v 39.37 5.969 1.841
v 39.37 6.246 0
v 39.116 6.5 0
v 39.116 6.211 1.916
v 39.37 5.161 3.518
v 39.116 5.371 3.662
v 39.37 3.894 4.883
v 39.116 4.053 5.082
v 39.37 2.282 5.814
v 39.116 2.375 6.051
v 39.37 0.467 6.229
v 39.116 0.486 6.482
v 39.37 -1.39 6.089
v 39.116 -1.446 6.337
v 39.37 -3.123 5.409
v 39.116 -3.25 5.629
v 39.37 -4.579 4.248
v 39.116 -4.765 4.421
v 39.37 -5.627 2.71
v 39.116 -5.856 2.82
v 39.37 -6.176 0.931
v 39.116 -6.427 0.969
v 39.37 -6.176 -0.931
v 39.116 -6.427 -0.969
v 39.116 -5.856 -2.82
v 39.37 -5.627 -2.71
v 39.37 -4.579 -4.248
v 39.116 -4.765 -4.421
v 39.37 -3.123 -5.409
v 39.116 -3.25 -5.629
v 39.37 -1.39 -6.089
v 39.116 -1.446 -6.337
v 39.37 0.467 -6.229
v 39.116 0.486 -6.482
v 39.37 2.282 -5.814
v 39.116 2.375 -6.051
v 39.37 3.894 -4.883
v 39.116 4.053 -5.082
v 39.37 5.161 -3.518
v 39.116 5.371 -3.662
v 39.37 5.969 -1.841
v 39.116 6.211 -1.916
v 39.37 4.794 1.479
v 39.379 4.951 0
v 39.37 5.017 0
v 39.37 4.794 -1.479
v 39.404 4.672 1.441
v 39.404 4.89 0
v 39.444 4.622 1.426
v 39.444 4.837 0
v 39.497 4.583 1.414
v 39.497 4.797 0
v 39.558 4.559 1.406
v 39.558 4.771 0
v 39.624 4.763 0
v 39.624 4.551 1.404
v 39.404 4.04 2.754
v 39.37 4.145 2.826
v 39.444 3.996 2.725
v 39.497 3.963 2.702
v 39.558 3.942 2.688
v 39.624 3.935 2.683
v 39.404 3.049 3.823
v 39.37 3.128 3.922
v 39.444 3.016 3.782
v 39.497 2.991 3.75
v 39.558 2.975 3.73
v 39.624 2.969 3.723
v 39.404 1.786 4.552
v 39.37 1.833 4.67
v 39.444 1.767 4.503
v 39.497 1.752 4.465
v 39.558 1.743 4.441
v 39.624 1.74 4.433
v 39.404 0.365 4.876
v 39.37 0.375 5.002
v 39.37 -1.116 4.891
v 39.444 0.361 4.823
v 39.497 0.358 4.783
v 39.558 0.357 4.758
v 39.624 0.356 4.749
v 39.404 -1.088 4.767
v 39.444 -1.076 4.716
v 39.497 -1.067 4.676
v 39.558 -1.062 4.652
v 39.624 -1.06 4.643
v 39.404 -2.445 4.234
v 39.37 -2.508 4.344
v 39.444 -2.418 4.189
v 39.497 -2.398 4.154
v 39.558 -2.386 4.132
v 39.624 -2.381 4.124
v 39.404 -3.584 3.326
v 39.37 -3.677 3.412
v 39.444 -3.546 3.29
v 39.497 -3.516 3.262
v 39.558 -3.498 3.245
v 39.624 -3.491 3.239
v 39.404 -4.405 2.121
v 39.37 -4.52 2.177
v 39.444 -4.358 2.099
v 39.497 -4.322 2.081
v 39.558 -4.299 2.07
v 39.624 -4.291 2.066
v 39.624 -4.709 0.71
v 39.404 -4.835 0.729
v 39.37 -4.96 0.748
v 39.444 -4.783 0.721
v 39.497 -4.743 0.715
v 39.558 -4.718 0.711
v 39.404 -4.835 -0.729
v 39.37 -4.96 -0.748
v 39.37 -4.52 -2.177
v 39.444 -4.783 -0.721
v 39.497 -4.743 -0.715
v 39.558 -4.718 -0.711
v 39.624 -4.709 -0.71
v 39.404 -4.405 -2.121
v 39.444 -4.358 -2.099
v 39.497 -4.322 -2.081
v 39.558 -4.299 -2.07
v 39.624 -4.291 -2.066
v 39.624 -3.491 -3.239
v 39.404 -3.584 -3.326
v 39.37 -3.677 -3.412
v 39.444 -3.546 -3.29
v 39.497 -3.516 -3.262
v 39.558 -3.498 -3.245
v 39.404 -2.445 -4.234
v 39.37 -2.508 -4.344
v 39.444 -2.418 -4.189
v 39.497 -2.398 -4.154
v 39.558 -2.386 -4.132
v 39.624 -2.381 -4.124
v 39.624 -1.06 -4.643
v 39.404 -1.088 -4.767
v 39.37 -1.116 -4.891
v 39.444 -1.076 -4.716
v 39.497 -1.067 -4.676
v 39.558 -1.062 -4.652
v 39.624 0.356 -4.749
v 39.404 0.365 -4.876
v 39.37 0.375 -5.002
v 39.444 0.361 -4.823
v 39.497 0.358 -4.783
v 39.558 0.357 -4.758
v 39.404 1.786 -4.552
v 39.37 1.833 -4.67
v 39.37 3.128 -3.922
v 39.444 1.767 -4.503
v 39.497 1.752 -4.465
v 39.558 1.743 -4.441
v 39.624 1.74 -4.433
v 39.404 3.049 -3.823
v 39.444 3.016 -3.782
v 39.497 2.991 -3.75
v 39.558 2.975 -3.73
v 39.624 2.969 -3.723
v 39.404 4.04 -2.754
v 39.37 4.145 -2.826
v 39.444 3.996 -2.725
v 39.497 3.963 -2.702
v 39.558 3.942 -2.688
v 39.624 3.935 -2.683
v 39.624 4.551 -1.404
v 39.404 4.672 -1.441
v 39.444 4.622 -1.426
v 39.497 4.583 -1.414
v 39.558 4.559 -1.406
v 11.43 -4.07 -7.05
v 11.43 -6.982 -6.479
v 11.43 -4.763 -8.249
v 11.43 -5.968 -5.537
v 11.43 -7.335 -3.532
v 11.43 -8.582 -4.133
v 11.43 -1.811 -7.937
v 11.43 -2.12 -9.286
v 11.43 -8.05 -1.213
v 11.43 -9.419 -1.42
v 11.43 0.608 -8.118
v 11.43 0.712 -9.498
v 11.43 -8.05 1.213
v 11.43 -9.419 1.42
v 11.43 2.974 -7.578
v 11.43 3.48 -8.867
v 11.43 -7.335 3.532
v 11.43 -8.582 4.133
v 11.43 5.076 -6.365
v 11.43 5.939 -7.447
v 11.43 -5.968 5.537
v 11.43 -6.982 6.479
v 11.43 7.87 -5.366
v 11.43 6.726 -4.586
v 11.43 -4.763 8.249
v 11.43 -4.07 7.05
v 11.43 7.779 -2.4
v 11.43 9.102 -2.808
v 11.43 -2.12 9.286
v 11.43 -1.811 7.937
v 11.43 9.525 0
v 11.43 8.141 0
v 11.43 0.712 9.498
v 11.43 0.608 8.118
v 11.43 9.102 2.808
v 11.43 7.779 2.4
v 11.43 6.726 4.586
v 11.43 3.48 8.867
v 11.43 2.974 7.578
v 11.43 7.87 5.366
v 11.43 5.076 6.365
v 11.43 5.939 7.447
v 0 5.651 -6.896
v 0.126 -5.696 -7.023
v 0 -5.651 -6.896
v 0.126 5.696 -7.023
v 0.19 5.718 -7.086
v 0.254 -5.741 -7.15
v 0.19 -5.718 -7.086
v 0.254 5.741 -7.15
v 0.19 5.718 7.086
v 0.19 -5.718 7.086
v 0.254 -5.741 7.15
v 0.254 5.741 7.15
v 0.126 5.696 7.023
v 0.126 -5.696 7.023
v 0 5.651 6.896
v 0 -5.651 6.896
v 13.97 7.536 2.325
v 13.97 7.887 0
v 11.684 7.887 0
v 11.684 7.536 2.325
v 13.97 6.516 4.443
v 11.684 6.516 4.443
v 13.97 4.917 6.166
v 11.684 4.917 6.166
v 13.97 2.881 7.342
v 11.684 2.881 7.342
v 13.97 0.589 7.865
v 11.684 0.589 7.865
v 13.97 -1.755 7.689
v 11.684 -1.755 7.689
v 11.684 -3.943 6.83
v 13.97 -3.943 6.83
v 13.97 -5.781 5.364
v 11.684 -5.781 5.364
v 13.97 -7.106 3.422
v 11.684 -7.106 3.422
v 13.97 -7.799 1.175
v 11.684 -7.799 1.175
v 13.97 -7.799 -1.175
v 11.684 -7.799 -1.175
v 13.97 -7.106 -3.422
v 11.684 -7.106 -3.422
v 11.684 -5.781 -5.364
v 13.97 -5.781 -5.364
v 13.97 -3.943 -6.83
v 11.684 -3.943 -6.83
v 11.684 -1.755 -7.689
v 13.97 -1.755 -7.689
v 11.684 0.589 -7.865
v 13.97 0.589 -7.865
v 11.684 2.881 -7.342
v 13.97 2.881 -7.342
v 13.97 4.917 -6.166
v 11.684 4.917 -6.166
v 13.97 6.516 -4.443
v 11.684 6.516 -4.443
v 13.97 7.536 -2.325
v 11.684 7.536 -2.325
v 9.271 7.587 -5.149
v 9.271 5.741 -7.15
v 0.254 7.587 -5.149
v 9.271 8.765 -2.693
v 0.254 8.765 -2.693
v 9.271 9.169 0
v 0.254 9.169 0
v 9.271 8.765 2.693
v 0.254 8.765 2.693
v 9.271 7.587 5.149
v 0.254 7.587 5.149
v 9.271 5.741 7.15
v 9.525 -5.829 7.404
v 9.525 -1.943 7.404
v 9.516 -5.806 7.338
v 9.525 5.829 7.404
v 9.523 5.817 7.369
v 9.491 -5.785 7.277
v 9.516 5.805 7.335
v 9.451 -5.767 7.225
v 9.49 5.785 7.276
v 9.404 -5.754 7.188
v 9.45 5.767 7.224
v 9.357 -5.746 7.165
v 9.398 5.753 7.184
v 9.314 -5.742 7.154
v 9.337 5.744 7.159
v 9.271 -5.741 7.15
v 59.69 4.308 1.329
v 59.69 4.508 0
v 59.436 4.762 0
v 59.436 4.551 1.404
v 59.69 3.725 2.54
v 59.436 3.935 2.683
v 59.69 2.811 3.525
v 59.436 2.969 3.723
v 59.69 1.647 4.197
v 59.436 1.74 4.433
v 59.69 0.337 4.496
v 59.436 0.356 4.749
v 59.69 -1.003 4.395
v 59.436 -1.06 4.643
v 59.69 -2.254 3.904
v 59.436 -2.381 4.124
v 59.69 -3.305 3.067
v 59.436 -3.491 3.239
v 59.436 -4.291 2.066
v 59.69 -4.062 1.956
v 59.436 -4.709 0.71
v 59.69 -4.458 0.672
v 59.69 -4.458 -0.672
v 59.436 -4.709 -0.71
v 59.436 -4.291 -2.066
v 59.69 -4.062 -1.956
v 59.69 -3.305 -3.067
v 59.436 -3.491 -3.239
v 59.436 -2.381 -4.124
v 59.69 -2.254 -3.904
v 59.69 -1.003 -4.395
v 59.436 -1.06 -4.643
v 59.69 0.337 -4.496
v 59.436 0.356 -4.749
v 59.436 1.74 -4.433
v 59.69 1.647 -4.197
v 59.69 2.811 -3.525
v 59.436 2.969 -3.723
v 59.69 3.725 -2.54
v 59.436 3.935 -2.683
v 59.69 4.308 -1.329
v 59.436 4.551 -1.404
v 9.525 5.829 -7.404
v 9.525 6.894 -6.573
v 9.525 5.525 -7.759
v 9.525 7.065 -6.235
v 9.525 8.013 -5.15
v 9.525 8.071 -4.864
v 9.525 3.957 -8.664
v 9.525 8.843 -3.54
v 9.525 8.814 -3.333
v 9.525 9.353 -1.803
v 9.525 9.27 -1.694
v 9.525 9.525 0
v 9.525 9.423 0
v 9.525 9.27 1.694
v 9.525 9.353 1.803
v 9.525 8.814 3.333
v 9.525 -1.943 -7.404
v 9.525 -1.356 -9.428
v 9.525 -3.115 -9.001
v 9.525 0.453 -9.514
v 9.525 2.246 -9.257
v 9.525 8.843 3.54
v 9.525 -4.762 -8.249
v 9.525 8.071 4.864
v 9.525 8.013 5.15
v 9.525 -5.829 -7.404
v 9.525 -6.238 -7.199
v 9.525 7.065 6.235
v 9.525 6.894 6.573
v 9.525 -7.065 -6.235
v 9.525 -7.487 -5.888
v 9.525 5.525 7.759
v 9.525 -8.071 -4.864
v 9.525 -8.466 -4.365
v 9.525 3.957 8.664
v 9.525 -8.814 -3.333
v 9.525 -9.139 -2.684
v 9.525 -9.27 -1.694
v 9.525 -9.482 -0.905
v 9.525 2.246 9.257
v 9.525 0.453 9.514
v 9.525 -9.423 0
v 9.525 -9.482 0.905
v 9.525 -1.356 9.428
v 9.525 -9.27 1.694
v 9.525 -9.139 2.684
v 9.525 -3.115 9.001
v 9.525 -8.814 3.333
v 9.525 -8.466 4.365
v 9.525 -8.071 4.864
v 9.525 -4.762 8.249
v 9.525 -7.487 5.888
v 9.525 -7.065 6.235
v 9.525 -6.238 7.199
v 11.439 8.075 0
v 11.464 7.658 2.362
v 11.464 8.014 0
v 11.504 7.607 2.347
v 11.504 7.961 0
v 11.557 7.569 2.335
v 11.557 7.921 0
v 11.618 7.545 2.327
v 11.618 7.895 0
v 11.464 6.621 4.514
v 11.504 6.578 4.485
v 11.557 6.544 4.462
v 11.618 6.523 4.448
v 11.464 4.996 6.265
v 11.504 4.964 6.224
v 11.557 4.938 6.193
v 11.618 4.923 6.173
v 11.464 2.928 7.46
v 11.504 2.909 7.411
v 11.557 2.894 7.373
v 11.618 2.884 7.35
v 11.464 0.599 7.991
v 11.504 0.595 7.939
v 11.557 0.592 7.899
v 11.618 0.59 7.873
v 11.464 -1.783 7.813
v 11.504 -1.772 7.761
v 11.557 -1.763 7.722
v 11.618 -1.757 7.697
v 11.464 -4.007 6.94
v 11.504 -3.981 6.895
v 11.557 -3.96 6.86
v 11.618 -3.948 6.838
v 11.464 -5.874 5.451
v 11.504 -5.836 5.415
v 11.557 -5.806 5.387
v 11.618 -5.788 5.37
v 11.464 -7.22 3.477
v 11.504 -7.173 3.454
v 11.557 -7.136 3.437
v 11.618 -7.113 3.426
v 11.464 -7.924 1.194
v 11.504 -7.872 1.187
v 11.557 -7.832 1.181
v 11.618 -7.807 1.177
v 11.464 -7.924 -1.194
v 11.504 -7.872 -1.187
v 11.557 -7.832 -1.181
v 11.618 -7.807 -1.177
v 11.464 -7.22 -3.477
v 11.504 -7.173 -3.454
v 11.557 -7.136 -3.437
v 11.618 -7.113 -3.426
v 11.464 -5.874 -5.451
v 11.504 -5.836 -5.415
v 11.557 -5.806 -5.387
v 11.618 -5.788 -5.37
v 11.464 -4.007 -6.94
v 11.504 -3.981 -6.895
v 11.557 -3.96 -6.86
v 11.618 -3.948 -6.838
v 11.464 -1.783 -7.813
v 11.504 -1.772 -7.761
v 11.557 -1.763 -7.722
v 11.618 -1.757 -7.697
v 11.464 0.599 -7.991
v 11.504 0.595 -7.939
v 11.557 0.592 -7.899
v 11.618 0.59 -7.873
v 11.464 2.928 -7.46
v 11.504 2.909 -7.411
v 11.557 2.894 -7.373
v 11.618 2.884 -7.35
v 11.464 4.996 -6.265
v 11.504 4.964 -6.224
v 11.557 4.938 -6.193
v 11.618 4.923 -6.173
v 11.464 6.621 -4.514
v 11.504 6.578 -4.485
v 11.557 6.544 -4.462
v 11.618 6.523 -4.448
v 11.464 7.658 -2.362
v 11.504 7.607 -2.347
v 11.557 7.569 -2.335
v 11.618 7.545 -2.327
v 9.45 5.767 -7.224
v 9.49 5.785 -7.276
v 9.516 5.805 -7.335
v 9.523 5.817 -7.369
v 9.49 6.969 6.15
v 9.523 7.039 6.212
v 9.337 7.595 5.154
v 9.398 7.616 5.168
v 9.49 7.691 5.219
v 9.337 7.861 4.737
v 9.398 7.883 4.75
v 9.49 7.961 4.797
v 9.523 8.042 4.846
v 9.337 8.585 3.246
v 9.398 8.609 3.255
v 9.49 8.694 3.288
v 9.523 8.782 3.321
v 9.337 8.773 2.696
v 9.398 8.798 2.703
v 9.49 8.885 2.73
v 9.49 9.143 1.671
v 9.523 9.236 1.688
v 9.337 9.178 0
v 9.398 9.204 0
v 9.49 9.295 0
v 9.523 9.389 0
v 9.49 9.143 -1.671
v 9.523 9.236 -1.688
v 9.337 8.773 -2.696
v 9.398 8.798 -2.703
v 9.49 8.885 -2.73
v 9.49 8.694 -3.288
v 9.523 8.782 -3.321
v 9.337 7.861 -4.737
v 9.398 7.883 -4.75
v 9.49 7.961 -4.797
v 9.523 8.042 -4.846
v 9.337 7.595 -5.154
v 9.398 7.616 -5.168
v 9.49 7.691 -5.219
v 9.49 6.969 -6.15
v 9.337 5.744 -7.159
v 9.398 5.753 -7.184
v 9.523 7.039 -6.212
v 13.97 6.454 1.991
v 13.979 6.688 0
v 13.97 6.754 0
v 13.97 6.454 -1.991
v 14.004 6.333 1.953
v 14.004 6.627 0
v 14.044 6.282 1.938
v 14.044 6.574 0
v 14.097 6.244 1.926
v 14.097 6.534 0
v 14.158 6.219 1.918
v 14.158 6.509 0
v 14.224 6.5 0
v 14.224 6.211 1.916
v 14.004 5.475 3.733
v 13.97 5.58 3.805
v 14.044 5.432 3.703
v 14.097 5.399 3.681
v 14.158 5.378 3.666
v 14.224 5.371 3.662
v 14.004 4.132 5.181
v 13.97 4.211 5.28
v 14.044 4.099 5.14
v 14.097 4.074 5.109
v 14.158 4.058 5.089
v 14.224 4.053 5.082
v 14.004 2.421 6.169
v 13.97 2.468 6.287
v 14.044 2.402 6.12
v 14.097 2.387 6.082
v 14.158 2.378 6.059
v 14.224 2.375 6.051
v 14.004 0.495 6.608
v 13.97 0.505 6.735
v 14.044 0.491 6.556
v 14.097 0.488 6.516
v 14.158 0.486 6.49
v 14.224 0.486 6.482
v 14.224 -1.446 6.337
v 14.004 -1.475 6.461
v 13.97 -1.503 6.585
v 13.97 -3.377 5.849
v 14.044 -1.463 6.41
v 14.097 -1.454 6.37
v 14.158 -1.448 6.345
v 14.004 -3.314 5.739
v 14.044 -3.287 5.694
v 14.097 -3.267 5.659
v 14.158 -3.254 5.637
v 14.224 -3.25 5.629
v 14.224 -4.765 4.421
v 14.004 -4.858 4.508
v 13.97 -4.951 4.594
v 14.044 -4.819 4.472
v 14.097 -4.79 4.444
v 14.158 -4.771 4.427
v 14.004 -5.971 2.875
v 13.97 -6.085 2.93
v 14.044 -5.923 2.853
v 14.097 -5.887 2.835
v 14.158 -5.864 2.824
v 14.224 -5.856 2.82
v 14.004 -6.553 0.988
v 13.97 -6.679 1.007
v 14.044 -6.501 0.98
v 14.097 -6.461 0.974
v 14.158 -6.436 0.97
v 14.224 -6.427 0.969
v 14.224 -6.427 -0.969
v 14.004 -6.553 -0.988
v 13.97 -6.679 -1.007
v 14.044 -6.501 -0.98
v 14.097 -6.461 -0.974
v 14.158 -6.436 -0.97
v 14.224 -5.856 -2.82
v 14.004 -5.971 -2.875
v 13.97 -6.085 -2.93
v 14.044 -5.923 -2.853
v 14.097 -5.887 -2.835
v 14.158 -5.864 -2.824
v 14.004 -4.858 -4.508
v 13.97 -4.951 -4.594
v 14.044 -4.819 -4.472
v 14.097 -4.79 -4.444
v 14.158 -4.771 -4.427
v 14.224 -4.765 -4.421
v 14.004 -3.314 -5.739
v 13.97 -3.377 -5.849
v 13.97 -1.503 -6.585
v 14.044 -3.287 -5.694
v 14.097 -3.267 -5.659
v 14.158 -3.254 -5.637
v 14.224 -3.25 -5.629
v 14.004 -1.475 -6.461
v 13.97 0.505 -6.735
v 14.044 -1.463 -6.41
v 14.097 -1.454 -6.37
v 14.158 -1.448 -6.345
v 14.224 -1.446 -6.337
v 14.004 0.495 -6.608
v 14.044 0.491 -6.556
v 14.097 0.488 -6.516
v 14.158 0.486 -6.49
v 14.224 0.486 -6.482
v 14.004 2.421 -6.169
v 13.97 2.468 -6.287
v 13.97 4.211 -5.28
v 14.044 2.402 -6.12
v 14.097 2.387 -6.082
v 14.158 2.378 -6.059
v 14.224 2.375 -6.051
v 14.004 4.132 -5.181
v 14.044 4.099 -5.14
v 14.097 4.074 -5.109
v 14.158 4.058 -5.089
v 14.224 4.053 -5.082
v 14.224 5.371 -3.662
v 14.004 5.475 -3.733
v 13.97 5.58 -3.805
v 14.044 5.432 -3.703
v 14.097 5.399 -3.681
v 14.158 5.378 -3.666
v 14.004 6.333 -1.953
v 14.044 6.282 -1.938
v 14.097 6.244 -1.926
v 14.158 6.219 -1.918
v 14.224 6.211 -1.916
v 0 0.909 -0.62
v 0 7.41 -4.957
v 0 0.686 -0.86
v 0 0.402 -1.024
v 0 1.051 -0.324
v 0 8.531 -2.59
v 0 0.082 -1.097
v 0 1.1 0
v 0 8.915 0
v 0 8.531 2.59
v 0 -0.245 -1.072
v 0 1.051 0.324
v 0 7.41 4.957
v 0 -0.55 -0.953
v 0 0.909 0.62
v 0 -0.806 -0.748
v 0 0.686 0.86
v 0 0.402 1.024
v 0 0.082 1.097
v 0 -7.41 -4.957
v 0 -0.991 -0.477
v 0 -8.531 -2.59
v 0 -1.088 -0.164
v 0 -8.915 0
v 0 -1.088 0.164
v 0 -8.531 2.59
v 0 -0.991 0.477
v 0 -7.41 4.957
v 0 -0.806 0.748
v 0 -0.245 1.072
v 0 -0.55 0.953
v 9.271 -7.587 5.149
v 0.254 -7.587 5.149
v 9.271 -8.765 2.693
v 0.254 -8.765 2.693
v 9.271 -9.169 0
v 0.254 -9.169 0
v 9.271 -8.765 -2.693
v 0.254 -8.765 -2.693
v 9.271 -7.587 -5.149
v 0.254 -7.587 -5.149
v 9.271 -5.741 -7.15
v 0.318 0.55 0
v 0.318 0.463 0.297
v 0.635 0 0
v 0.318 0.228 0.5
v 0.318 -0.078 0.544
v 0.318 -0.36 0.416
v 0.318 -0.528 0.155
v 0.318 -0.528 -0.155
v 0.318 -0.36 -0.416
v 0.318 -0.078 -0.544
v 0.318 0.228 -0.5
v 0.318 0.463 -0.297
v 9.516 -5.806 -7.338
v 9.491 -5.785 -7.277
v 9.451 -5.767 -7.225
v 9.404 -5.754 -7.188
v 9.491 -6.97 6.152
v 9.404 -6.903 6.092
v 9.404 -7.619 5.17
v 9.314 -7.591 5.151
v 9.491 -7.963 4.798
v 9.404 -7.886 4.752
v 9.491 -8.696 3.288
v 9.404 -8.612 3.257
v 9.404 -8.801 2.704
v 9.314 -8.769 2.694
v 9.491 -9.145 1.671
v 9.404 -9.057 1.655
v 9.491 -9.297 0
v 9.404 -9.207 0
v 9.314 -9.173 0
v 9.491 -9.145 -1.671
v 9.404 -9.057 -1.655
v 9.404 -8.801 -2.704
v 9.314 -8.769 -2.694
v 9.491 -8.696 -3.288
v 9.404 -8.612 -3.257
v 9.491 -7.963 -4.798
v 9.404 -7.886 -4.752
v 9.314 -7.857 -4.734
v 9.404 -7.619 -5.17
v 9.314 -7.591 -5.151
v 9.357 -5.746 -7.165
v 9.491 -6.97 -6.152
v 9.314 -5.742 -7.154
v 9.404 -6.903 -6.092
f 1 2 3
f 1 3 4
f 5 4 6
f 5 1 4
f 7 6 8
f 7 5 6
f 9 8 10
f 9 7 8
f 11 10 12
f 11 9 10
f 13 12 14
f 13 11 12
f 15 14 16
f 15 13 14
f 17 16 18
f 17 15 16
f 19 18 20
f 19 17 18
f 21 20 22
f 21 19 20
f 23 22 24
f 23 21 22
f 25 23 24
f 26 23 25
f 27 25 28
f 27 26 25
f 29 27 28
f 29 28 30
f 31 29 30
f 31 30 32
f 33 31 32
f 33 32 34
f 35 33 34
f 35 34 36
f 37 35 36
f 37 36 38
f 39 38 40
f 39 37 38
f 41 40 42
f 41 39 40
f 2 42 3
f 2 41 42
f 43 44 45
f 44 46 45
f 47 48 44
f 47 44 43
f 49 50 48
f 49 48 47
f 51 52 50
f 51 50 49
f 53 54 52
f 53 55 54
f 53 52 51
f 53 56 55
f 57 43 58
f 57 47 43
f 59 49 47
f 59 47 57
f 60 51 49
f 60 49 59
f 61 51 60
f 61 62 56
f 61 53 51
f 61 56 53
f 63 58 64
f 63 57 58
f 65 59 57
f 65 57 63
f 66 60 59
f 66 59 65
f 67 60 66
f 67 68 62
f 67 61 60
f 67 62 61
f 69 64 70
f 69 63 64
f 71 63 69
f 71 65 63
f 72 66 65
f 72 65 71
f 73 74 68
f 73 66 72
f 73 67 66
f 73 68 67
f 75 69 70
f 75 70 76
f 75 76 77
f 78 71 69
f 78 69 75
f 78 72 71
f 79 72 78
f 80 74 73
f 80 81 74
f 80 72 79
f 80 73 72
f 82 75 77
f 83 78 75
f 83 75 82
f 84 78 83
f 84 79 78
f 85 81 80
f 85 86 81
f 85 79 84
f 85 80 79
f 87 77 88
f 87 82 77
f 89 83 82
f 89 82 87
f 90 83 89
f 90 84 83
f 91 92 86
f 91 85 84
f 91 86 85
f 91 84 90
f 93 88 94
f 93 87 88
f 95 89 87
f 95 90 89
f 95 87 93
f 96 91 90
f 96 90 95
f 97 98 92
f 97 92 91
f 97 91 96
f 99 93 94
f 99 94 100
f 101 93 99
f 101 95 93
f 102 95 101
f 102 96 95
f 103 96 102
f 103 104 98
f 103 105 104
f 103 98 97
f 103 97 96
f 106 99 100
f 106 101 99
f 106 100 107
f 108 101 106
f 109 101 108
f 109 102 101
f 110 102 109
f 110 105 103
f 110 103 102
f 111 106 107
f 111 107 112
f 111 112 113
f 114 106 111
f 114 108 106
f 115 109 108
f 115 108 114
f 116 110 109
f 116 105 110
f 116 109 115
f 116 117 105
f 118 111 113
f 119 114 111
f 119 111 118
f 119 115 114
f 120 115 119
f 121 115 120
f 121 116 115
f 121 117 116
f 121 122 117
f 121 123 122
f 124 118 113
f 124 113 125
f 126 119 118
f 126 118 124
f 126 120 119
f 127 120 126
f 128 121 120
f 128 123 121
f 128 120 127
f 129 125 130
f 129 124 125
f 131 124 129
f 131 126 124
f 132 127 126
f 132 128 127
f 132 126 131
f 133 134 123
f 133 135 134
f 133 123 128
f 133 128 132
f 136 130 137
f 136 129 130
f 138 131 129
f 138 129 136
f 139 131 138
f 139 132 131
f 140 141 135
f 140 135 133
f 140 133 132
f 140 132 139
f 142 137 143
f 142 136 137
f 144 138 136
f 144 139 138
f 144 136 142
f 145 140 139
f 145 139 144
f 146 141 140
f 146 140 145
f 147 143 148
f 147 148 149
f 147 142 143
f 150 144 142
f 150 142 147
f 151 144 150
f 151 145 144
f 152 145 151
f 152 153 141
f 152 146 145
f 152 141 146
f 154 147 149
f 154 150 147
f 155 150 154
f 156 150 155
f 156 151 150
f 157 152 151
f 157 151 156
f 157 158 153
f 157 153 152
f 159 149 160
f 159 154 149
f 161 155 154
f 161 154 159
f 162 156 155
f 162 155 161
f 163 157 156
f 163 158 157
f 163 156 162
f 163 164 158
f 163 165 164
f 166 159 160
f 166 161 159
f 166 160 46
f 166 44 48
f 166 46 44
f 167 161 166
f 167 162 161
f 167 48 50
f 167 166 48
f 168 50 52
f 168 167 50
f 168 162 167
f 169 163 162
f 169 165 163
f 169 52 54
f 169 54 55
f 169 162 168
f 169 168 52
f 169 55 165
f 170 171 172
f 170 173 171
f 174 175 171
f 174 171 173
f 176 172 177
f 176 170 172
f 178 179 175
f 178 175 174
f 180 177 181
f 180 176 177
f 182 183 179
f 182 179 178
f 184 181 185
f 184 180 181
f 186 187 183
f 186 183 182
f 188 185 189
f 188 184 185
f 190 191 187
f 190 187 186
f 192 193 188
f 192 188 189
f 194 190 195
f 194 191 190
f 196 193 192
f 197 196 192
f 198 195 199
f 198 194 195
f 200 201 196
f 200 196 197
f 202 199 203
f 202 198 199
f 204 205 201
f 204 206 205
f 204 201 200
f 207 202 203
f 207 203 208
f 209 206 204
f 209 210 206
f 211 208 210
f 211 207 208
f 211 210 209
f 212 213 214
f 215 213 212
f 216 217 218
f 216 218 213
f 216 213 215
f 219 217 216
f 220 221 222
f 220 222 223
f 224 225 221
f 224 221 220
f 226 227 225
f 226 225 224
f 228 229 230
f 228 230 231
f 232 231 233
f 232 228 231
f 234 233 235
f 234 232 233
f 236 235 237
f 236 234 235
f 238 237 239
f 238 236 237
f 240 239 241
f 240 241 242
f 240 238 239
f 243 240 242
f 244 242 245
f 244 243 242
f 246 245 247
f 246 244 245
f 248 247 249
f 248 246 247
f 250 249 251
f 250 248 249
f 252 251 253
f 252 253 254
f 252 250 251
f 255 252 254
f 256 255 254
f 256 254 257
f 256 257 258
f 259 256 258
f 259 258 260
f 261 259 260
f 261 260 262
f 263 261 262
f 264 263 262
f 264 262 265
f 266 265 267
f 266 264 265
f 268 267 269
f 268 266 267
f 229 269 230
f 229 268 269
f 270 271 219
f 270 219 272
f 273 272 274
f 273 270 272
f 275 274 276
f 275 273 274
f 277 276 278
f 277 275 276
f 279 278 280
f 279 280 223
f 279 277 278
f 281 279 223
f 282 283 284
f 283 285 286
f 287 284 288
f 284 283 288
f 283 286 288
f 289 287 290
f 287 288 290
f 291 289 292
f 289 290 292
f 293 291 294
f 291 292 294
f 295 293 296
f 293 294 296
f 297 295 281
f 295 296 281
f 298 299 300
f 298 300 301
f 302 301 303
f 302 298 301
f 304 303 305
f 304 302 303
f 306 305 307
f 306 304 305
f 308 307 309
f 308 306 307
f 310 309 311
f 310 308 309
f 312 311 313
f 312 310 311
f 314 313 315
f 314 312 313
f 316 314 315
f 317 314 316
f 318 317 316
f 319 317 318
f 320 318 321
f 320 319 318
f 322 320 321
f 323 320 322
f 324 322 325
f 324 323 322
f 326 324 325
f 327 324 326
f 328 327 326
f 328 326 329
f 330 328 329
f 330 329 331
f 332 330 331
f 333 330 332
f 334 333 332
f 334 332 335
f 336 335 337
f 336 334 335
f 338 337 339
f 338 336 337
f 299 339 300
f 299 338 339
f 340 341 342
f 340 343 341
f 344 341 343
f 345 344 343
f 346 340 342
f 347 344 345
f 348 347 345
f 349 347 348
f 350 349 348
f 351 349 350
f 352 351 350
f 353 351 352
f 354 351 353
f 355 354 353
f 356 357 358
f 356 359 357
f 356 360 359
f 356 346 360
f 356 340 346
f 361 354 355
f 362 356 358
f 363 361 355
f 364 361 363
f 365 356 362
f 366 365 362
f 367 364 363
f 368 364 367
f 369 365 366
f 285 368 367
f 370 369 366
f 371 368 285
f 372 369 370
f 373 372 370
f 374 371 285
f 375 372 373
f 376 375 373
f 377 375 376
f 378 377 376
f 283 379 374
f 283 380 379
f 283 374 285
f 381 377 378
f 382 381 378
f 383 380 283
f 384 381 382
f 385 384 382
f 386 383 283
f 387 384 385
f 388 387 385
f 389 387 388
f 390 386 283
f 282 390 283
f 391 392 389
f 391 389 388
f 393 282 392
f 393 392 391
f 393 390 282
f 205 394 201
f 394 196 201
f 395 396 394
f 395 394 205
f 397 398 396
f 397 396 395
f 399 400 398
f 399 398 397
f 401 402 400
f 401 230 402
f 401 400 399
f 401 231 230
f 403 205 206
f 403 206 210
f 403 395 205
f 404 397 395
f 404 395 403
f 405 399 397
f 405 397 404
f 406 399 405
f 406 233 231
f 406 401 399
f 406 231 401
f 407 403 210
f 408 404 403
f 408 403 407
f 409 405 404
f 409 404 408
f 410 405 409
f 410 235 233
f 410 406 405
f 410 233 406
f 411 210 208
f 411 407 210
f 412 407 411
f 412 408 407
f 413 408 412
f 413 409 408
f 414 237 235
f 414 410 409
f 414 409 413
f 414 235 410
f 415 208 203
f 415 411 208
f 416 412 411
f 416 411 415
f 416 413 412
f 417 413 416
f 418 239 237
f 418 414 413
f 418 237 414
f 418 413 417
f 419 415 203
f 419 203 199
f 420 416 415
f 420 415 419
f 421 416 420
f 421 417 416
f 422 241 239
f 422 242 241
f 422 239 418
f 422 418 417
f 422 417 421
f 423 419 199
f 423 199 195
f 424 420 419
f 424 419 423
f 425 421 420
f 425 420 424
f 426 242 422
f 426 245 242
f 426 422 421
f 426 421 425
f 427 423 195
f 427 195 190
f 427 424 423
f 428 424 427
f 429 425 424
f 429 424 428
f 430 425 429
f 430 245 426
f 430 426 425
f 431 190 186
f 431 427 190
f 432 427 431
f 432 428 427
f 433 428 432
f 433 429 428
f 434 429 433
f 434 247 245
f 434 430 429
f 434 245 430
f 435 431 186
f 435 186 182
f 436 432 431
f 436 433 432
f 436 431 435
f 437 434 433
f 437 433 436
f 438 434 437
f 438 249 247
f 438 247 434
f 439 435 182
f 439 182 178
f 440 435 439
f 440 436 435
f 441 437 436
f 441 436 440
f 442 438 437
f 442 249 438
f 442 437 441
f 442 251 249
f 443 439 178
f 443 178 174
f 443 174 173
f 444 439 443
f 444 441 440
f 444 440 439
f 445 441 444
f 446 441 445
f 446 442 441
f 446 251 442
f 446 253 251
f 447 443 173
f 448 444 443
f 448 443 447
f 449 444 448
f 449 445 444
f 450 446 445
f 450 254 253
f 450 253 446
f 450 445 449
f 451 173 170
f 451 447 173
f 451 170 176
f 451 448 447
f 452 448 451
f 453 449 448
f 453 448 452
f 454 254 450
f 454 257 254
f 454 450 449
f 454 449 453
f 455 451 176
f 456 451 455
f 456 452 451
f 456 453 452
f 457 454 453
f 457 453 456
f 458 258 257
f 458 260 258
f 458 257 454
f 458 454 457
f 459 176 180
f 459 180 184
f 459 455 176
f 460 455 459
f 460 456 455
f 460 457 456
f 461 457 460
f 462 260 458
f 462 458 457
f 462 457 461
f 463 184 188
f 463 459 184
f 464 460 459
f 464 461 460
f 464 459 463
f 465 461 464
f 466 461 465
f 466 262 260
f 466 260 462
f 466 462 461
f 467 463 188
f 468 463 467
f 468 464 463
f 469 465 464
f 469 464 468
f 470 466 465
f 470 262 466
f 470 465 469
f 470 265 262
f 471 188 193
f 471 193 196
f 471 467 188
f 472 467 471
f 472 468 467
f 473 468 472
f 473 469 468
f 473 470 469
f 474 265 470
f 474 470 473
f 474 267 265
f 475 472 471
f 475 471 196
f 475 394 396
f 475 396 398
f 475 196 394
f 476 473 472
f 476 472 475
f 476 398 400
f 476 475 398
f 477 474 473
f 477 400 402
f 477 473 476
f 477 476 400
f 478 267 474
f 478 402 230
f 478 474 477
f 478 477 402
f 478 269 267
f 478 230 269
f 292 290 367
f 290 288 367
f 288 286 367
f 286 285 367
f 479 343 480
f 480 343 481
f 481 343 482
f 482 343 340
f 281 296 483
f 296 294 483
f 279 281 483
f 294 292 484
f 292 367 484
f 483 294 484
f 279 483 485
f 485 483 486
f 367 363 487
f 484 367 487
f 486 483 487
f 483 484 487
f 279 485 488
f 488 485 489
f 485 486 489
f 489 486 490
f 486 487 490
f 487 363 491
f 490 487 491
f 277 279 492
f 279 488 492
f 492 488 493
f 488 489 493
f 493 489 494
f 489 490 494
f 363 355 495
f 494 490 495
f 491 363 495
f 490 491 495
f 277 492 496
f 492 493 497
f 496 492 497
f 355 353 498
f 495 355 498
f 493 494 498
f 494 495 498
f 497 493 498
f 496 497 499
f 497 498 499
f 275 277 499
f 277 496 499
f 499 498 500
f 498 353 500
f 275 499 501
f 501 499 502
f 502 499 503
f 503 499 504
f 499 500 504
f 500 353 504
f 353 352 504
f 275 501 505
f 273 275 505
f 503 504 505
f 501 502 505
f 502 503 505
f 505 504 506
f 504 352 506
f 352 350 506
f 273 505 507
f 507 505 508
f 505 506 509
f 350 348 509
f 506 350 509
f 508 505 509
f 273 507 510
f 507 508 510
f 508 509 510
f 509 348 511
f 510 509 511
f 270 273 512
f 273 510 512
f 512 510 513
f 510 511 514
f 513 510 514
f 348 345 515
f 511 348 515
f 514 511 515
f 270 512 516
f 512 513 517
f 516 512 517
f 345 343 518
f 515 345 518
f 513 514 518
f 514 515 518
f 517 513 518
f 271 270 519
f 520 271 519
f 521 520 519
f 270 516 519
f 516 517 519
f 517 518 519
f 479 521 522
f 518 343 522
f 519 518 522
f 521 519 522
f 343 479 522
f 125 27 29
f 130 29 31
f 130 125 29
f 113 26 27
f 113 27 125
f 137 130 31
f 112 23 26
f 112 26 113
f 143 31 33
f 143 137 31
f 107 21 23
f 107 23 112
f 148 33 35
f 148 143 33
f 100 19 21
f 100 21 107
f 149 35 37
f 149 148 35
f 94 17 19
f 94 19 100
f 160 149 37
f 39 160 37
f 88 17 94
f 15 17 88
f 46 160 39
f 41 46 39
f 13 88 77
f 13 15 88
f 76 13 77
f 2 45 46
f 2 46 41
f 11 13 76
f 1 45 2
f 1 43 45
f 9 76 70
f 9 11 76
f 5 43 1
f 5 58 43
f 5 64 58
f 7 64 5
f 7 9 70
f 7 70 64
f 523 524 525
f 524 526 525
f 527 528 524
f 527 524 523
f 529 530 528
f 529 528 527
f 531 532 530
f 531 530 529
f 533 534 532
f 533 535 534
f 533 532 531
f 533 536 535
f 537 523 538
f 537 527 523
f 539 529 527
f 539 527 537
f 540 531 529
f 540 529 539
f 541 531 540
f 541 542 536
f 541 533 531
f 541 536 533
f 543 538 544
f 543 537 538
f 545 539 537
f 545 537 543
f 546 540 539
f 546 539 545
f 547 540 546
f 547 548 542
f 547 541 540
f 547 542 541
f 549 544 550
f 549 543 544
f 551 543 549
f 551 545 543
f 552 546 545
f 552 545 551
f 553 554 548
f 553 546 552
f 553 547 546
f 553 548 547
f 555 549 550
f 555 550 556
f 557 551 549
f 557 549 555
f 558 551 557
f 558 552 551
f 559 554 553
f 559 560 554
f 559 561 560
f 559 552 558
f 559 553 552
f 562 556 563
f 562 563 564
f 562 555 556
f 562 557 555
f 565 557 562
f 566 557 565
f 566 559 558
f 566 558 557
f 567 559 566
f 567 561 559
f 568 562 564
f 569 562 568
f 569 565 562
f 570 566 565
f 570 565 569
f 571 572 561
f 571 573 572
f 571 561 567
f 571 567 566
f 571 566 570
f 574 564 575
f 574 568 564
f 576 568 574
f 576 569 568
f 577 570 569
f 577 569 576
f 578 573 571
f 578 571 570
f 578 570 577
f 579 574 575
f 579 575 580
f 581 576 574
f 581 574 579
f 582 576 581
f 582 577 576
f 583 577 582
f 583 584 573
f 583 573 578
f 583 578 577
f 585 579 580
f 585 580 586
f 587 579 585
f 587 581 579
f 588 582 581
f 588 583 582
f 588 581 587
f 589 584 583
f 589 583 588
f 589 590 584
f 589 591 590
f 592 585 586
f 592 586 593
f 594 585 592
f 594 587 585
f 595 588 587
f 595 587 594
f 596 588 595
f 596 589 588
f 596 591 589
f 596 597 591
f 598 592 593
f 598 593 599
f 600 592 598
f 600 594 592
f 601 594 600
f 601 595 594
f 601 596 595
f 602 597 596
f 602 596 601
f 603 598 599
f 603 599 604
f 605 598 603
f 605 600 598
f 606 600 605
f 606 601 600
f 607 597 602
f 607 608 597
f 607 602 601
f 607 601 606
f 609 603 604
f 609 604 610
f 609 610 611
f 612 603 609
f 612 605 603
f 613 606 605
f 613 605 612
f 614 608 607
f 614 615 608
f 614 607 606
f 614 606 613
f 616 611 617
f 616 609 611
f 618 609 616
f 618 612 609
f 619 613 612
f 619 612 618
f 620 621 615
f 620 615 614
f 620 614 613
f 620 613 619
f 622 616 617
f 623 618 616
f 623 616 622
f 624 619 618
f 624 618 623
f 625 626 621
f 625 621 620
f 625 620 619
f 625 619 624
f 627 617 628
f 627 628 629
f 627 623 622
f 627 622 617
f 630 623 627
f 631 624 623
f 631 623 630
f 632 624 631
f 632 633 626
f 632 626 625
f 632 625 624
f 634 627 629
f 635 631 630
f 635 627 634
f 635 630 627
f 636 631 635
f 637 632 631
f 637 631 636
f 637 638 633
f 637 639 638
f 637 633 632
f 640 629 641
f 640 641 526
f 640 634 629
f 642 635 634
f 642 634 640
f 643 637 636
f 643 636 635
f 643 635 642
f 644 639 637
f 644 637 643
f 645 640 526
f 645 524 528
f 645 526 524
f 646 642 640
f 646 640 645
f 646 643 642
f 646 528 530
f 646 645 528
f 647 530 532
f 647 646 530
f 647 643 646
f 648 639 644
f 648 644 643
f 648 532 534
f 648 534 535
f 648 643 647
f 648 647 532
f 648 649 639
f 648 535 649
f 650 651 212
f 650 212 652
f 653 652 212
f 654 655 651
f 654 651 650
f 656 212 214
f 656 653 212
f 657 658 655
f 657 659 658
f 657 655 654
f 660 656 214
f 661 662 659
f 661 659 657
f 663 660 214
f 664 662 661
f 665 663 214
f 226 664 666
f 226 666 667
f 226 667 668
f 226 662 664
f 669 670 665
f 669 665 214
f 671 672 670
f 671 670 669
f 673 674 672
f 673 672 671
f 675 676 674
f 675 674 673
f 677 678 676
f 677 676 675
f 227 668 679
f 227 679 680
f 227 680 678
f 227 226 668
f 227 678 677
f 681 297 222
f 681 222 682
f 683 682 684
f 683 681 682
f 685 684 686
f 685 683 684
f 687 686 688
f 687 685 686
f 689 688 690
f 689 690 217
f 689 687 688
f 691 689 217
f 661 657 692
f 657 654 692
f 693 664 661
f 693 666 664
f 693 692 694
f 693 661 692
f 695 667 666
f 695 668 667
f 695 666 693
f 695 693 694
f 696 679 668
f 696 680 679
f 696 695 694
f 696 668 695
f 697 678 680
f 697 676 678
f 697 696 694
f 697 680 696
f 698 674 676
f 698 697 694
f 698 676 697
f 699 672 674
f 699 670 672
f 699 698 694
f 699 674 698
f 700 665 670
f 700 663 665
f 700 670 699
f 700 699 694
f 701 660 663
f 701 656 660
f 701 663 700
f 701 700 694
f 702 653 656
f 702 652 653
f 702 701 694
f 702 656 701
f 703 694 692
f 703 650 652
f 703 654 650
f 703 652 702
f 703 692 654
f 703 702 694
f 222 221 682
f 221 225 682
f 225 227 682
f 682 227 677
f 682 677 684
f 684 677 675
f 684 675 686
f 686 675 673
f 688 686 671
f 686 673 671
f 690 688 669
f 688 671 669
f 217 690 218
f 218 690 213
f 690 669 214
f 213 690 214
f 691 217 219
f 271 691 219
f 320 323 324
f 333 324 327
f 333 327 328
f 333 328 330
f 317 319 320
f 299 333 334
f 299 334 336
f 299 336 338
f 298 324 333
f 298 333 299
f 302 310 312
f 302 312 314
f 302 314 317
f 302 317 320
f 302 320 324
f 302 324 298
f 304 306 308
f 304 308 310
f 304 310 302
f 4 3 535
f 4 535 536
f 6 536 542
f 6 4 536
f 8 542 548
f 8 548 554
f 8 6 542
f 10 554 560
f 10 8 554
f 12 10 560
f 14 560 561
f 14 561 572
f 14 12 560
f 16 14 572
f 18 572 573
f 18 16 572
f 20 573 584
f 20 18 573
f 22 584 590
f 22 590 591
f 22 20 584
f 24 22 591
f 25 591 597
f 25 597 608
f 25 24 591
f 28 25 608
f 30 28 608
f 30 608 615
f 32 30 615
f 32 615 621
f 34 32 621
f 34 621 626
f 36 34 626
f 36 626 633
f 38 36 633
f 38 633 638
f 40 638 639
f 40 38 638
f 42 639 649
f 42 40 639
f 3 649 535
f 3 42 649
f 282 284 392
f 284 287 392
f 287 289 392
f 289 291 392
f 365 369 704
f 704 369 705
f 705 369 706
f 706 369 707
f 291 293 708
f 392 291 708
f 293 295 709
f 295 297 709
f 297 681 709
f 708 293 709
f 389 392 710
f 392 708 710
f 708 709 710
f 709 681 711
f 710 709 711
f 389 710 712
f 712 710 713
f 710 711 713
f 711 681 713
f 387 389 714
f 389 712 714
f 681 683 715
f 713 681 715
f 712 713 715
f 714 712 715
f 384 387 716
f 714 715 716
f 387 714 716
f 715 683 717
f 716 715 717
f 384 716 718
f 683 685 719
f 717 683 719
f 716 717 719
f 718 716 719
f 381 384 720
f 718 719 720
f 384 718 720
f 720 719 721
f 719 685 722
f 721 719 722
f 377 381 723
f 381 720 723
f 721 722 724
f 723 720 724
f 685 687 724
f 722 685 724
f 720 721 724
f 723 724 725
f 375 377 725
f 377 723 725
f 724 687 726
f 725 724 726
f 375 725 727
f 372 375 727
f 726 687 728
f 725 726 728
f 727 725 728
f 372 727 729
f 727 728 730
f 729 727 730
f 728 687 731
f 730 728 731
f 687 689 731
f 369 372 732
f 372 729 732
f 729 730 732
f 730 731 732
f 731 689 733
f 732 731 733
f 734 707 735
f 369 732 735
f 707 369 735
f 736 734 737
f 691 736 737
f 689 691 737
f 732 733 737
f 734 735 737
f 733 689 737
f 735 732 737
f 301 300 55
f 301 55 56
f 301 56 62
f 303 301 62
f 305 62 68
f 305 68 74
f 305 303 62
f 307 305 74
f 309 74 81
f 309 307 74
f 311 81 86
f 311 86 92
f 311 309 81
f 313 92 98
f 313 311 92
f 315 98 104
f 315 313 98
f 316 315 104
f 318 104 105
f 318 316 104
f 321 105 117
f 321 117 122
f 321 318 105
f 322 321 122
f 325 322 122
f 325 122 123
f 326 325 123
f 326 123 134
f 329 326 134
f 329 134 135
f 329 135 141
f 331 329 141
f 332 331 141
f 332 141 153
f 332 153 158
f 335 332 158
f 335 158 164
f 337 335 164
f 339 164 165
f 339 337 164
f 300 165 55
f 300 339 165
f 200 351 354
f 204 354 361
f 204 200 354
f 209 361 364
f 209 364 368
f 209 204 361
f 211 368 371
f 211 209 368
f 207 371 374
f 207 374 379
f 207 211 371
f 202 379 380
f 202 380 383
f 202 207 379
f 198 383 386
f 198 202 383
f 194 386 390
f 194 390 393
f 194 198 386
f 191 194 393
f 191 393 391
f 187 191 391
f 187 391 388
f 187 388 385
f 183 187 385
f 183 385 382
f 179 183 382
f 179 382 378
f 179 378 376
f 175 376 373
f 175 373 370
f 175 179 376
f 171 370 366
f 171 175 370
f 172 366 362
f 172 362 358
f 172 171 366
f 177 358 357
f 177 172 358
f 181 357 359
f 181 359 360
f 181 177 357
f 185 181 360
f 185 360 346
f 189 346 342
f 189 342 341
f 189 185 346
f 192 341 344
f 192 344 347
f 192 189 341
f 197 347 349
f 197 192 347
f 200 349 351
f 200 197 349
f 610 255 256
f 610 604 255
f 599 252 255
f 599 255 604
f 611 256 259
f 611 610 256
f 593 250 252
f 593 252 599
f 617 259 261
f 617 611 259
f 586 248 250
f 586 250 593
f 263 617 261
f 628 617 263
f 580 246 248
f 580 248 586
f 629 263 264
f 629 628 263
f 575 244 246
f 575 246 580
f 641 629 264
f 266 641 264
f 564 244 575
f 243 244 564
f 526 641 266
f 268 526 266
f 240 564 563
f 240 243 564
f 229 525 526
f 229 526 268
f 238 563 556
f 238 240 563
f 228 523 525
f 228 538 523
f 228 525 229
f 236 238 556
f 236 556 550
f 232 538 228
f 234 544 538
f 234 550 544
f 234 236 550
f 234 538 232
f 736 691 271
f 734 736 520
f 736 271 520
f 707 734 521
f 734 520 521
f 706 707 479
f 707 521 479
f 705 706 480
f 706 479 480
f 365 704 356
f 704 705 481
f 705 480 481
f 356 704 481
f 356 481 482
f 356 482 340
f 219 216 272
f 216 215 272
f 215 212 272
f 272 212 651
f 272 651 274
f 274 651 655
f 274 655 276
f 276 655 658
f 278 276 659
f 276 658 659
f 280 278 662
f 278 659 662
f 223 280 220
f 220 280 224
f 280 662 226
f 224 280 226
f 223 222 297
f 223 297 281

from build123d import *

# Parameters (mm, degrees)
CUT_EXTRUDE1_DEPTH = 9.525
CHAMFER1_SIZE      = 0.254
FILLET1_R          = 0.254


with BuildPart() as part:
    # Sketch1 → Revolve1 (revolve)
    with BuildSketch(Plane.XY):
        Polygon((0, 9.1694), (9.525, 9.1694), (9.525, 9.525), (11.43, 9.525), (11.43, 7.8867), (13.97, 7.8867), (13.97, 6.5), (39.37, 6.5), (39.37, 4.7625), (59.69, 4.7625), (59.69, 0), (0.635, 0), (0, 1.099852263), align=None)
    revolve(axis=Axis((0, 0, 0), (1, 0, 0)))

    # Sketch2 → Cut-Extrude1 (cut)
    with BuildSketch(Plane.ZY):
        with BuildLine():
            Line((-7.1501, -5.740554533), (-7.1501, 5.740554533))
            ThreePointArc((-7.1501, 5.740554533), (-9.1694, 0), (-7.1501, -5.740554533))
        make_face()
        with BuildLine():
            Line((7.1501, -5.740554533), (7.1501, 5.740554533))
            ThreePointArc((7.1501, 5.740554533), (9.1694, 0), (7.1501, -5.740554533))
        make_face()
    extrude(amount=-CUT_EXTRUDE1_DEPTH, mode=Mode.SUBTRACT)

    # Chamfer1
    chamfer1_edges = [part.edges().sort_by_distance(p)[0] for p in [
        (0, 9.1694, 0),
        (39.37, -6.5, 0),
        (0, 0, 7.1501),
        (0, -9.1694, 0),
        (0, 0, -7.1501),
        (59.69, -4.7625, 0),
    ]]
    chamfer(chamfer1_edges, length=CHAMFER1_SIZE)

    # Fillet1
    fillet1_edges = [part.edges().sort_by_distance(p)[0] for p in [
        (9.525, 9.1694, 0),
        (11.43, -7.8867, 0),
        (13.97, -6.5, 0),
        (9.525, 0, 7.1501),
        (9.525, -9.1694, 0),
        (9.525, 0, -7.1501),
        (39.37, -4.7625, 0),
    ]]
    fillet(fillet1_edges, radius=FILLET1_R)


solid = part.part
